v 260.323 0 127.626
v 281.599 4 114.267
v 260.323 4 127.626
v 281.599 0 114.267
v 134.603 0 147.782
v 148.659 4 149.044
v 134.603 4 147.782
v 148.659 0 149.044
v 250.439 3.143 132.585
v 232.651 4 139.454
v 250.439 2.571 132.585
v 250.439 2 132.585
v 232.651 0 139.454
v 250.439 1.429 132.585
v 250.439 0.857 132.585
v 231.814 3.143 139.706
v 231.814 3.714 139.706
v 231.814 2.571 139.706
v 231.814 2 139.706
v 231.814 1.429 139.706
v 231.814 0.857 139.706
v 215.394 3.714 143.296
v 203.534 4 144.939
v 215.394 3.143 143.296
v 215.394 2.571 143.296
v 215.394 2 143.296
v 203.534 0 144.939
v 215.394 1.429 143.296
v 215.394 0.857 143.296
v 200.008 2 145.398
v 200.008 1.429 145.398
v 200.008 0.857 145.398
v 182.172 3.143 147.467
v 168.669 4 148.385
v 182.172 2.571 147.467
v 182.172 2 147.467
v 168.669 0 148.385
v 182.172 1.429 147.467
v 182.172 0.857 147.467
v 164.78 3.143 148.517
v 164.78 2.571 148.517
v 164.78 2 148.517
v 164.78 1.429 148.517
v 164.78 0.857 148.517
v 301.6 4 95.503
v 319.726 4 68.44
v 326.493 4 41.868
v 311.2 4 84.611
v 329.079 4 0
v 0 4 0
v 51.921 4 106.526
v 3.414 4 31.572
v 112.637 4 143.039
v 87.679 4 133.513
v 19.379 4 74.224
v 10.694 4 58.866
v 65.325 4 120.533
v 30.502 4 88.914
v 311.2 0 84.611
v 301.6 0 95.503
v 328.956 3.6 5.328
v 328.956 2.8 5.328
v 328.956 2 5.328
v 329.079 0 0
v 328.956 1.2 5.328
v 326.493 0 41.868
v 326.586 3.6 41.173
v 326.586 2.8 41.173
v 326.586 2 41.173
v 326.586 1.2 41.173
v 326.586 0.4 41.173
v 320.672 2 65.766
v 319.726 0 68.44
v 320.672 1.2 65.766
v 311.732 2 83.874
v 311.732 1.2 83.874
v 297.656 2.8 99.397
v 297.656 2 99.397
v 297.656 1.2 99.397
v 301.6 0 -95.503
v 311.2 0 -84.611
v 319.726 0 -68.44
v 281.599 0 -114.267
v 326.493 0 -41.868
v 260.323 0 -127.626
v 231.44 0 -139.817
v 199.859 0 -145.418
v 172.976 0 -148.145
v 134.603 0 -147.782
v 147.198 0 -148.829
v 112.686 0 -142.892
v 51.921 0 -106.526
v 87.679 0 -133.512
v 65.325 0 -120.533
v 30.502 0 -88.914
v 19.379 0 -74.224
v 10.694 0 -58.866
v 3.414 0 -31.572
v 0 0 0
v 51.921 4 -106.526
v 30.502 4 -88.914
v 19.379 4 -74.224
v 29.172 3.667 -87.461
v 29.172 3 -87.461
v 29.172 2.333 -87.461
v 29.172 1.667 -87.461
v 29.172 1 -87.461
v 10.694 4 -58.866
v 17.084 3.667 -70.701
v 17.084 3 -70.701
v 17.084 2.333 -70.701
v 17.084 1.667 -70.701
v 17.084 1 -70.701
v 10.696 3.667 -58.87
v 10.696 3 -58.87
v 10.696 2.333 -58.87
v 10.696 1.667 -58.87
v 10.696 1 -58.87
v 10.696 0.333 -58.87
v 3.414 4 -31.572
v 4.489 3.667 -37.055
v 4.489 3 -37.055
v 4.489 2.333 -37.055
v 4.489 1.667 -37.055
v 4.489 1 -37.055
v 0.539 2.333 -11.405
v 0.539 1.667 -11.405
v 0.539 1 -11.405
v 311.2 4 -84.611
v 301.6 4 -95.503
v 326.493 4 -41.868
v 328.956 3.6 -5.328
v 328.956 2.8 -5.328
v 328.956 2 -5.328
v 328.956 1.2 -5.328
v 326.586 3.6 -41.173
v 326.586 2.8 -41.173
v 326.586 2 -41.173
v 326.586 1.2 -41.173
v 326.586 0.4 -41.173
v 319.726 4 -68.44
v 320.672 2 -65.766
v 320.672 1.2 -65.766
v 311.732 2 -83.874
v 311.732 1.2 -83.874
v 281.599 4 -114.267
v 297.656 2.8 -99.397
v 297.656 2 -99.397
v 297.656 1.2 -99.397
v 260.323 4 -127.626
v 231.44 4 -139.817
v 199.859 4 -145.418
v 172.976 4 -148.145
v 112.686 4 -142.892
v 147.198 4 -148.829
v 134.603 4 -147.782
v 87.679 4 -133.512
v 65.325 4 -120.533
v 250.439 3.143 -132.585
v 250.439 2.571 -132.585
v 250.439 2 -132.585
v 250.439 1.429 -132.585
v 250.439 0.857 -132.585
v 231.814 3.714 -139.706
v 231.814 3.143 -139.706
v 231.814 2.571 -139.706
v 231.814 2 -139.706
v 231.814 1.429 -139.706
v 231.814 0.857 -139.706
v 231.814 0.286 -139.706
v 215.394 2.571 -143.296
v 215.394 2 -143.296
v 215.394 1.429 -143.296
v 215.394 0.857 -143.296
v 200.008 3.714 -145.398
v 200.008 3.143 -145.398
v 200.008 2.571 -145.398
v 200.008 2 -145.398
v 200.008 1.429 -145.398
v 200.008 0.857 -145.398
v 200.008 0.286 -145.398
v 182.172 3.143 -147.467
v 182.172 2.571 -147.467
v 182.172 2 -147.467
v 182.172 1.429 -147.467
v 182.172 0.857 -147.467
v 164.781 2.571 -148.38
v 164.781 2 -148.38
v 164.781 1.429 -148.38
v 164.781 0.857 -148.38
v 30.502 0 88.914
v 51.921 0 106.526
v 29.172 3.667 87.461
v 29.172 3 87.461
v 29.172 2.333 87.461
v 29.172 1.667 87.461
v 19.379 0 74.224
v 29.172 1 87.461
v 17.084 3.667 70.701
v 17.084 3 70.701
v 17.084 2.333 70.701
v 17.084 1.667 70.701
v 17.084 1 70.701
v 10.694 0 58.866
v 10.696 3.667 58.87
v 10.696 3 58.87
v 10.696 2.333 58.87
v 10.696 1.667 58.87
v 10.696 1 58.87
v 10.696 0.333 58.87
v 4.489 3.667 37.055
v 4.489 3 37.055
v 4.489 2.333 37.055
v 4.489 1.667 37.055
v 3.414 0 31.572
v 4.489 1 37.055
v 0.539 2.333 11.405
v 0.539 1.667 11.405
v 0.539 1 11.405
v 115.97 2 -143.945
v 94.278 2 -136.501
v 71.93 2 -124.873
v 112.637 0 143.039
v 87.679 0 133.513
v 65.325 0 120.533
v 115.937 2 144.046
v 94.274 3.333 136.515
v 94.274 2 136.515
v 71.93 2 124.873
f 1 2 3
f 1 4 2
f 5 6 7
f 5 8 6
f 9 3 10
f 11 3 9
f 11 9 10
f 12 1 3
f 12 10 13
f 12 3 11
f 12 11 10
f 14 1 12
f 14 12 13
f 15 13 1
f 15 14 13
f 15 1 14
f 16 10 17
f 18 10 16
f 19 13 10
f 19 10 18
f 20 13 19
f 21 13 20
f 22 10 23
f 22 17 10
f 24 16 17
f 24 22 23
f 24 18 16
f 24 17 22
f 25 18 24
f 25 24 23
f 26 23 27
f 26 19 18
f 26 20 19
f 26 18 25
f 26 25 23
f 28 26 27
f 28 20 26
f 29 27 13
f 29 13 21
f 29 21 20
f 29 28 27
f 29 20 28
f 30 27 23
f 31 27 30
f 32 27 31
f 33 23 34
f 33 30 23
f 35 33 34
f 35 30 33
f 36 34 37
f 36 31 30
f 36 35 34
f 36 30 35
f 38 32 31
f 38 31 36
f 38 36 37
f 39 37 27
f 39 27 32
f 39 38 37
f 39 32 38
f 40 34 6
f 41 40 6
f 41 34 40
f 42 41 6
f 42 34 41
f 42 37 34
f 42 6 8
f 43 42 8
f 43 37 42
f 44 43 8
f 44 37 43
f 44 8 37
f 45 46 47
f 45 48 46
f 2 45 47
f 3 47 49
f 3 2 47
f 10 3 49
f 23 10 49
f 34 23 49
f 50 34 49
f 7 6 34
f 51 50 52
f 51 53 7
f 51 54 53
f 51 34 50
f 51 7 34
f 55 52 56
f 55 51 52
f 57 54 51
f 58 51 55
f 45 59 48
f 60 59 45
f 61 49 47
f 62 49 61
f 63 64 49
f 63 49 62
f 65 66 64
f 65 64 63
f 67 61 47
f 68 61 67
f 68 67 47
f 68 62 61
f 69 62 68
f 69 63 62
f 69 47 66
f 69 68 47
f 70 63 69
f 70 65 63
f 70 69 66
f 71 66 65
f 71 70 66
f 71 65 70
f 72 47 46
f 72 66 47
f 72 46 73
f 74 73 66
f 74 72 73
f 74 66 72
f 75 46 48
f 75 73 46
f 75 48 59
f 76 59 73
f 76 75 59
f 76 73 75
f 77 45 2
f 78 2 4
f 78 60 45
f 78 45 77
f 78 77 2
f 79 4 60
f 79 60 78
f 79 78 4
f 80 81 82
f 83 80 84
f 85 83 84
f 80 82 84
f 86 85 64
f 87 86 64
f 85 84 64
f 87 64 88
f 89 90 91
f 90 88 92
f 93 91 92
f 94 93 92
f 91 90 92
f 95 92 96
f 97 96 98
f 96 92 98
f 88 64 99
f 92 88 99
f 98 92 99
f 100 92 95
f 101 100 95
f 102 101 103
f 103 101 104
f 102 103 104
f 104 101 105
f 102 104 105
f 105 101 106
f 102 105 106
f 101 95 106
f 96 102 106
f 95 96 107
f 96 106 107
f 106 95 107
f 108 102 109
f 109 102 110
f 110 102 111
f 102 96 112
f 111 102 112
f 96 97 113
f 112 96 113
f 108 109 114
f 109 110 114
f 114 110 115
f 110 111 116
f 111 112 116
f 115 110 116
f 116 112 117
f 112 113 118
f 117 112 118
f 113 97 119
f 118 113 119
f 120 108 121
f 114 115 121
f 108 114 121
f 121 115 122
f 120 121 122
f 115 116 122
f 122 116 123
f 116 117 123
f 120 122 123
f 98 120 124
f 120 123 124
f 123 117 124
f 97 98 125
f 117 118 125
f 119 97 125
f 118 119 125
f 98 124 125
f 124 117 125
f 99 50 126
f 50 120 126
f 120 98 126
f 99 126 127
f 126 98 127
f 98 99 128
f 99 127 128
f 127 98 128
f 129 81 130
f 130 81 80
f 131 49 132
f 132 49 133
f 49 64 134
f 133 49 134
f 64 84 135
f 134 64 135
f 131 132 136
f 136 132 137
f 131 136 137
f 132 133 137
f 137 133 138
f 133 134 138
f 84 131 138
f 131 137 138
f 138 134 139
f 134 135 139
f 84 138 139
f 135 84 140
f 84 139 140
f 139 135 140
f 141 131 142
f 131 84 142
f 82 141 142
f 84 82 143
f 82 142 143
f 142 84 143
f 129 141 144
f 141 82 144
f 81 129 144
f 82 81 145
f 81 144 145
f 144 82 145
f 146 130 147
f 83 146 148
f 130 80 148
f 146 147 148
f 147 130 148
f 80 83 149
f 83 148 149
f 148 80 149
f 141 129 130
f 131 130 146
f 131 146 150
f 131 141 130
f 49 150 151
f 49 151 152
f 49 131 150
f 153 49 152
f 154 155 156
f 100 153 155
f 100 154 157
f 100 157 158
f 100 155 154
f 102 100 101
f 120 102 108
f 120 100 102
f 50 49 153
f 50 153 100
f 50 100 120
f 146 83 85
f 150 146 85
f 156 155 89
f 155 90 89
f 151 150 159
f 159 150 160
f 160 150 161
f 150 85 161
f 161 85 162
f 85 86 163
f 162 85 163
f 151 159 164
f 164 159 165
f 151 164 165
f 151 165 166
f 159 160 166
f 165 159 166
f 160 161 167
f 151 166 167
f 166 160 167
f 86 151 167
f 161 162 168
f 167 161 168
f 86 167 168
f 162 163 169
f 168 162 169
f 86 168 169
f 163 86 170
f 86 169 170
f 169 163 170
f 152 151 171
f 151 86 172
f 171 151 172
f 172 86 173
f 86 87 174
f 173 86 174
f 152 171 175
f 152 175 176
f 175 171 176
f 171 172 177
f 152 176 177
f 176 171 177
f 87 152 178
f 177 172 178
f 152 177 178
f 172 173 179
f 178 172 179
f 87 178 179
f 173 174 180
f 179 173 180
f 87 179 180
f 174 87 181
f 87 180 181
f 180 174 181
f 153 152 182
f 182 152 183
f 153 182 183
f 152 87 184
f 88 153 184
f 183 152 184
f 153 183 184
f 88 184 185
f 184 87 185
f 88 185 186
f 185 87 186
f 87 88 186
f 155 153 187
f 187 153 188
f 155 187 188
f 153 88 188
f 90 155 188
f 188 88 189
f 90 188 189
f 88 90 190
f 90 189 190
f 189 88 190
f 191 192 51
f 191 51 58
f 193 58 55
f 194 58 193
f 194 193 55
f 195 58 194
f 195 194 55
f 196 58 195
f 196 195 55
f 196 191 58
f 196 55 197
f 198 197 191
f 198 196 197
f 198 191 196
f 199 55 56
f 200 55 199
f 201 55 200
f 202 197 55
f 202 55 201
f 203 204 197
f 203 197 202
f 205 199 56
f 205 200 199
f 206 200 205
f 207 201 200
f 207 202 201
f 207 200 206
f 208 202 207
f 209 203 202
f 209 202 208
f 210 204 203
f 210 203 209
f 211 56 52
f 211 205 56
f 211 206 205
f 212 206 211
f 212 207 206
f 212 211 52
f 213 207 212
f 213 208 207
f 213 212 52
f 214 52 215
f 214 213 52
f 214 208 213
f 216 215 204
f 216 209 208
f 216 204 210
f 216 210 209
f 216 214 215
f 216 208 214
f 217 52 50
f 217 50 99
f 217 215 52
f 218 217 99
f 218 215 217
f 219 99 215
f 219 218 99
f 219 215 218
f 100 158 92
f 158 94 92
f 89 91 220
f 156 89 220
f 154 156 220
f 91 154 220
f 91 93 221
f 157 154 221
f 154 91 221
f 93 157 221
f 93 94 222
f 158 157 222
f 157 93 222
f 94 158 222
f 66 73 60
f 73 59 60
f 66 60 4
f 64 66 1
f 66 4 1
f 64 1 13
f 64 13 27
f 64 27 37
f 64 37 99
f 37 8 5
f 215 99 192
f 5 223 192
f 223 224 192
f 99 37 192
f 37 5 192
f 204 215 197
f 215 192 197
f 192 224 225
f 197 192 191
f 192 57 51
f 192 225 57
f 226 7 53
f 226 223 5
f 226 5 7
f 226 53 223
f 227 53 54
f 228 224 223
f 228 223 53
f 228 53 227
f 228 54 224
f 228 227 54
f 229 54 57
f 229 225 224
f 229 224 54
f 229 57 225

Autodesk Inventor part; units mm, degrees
ref_plane "YZ Plane" through (0, 0, 0) normal (1, 0, 0) x (0, 1, 0)
ref_plane "XZ Plane" through (0, 0, 0) normal (0, 1, 0) x (-1, 0, 0)
ref_plane "XY Plane" through (0, 0, 0) normal (0, 0, 1) x (1, 0, 0)
sketch "Эскиз1" plane through (0, 0, 0) normal (0, 1, 0) x (-1, 0, 0)
  line L0 (-328.2756, -25.9261) -> (-328.9804, -14.346) construction
  line L1 (-328.9804, -14.346) -> (-329.4417, 0) construction
  line L2 (-329.4417, 0) -> (-328.3635, 17.7121) construction
  line L3 (-328.3635, 17.7121) -> (-327.4394, 35.1161) construction
  line L4 (-327.4394, 35.1161) -> (-325.96, 47.5638) construction
  line L5 (-325.96, 47.5638) -> (-322.3039, 60.9695) construction
  line L6 (-322.3039, 60.9695) -> (-319.1353, 70.8815) construction
  line L7 (-319.1353, 70.8815) -> (-314.3418, 80.4686) construction
  line L8 (-314.3418, 80.4686) -> (-309.3045, 87.4558) construction
  line L9 (-309.3045, 87.4558) -> (-302.3173, 94.9305) construction
  line L10 (-302.3173, 94.9305) -> (-295.98, 101.1053) construction
  line L11 (-295.98, 101.1053) -> (-288.7491, 107.7675) construction
  line L12 (-288.7491, 107.7675) -> (-281.5994, 114.2672) construction
  spline S0 degree 4 poles (-328.2756, -25.9261) (-328.9804, -14.346) (-329.4417, 0) (-328.3635, 17.7121) (-327.4394, 35.1161) (-325.96, 47.5638) (-322.3039, 60.9695) (-319.1353, 70.8815) (-314.3418, 80.4686) (-309.3045, 87.4558) (-302.3173, 94.9305) (-295.98, 101.1053) (-288.7491, 107.7675) (-281.5994, 114.2672) knots 1 1 1 1 1 2 3 4 5 6 7 8 9 10 11 11 11 11 11
  line L13 (-281.5994, 114.2672) -> (-273.0291, 120.561) construction
  line L14 (-273.0291, 120.561) -> (-264.5363, 125.5696) construction
  line L15 (-264.5363, 125.5696) -> (-254.3013, 130.7234) construction
  line L16 (-254.3013, 130.7234) -> (-246.2439, 134.7158) construction
  line L17 (-246.2439, 134.7158) -> (-236.5897, 138.3452) construction
  line L18 (-236.5897, 138.3452) -> (-226.8628, 141.2487) construction
  line L19 (-226.8628, 141.2487) -> (-219.3136, 142.7005) construction
  line L20 (-219.3136, 142.7005) -> (-211.474, 143.9345) construction
  line L21 (-211.474, 143.9345) -> (-203.9248, 144.8781) construction
  line L22 (-203.9248, 144.8781) -> (-196.2304, 145.8944) construction
  line L23 (-196.2304, 145.8944) -> (-187.0117, 147.1284) construction
  line L24 (-187.0117, 147.1284) -> (-177.2848, 147.8543) construction
  line L25 (-177.2848, 147.8543) -> (-168.6468, 148.5076) construction
  line L26 (-168.6468, 148.5076) -> (-161.0976, 148.5076) construction
  line L27 (-161.0976, 148.5076) -> (-152.9677, 149.1609) construction
  line L28 (-152.9677, 149.1609) -> (-144.6926, 149.1609) construction
  line L29 (-144.6926, 149.1609) -> (-134.6028, 147.7817) construction
  spline S1 degree 4 poles (-281.5994, 114.2672) (-273.0291, 120.561) (-264.5363, 125.5696) (-254.3013, 130.7234) (-246.2439, 134.7158) (-236.5897, 138.3452) (-226.8628, 141.2487) (-219.3136, 142.7005) (-211.474, 143.9345) (-203.9248, 144.8781) (-196.2304, 145.8944) (-187.0117, 147.1284) (-177.2848, 147.8543) (-168.6468, 148.5076) (-161.0976, 148.5076) (-152.9677, 149.1609) (-144.6926, 149.1609) (-134.6028, 147.7817) knots 1 1 1 1 1 2 3 4 5 6 7 8 9 10 11 12 13 14 15 15 15 15 15
  line L30 (-134.6028, 147.7817) -> (-125.6357, 146.6668) construction
  line L31 (-125.6357, 146.6668) -> (-119.0855, 145.1103) construction
  line L32 (-119.0855, 145.1103) -> (-109.2278, 141.9974) construction
  line L33 (-109.2278, 141.9974) -> (-99.435, 138.7547) construction
  line L34 (-99.435, 138.7547) -> (-89.1882, 134.4744) construction
  line L35 (-89.1882, 134.4744) -> (-78.4874, 128.8322) construction
  line L36 (-78.4874, 128.8322) -> (-69.2134, 123.3845) construction
  line L37 (-69.2134, 123.3845) -> (-60.588, 117.6774) construction
  line L38 (-60.588, 117.6774) -> (-51.9211, 106.5265) construction
  spline S2 degree 4 poles (-134.6028, 147.7817) (-125.6357, 146.6668) (-119.0855, 145.1103) (-109.2278, 141.9974) (-99.435, 138.7547) (-89.1882, 134.4744) (-78.4874, 128.8322) (-69.2134, 123.3845) (-60.588, 117.6774) (-51.9211, 106.5265) knots 1 1 1 1 1 2 3 4 5 6 7 7 7 7 7
  line L39 (-51.9211, 106.5265) -> (-45.8249, 101.9867) construction
  line L40 (-45.8249, 101.9867) -> (-39.145, 96.9282) construction
  line L41 (-39.145, 96.9282) -> (-31.8815, 90.832) construction
  line L42 (-31.8815, 90.832) -> (-26.1744, 84.1521) construction
  line L43 (-26.1744, 84.1521) -> (-19.9485, 75.2673) construction
  line L44 (-19.9485, 75.2673) -> (-13.8523, 65.669) construction
  line L45 (-13.8523, 65.669) -> (-12.0364, 62.3615) construction
  line L46 (-12.0364, 62.3615) -> (-9.5072, 56.0707) construction
  line L47 (-9.5072, 56.0707) -> (-5.8754, 44.462) construction
  line L48 (-5.8754, 44.462) -> (-2.957, 29.6755) construction
  line L49 (-2.957, 29.6755) -> (-1.0763, 17.7425) construction
  line L50 (-1.0763, 17.7425) -> (0.1559, 5.3556) construction
  line L51 (0.1559, 5.3556) -> (0.1559, -6.1883) construction
  line L52 (0.1559, -6.1883) -> (-0.8168, -22.8555) construction
  line L53 (-0.8168, -22.8555) -> (-2.3085, -36.4747) construction
  spline S3 degree 4 poles (-51.9211, 106.5265) (-45.8249, 101.9867) (-39.145, 96.9282) (-31.8815, 90.832) (-26.1744, 84.1521) (-19.9485, 75.2673) (-13.8523, 65.669) (-12.0364, 62.3615) (-9.5072, 56.0707) (-5.8754, 44.462) (-2.957, 29.6755) (-1.0763, 17.7425) (0.1559, 5.3556) (0.1559, -6.1883) (-0.8168, -22.8555) (-2.3085, -36.4747) knots 1 1 1 1 1 2 3 4 5 6 7 8 9 10 11 12 13 13 13 13 13
  line L54 (-329.4417, 0) -> (0, 0)
  line L55 (-328.2756, 25.9261) -> (-328.9804, 14.346) construction
  line L56 (-328.9804, 14.346) -> (-329.4417, 0) construction
  line L57 (-329.4417, 0) -> (-328.3635, -17.7121) construction
  line L58 (-328.3635, -17.7121) -> (-327.4394, -35.1161) construction
  line L59 (-327.4394, -35.1161) -> (-325.96, -47.5638) construction
  line L60 (-325.96, -47.5638) -> (-322.3039, -60.9695) construction
  line L61 (-322.3039, -60.9695) -> (-319.1353, -70.8815) construction
  line L62 (-319.1353, -70.8815) -> (-314.3418, -80.4686) construction
  line L63 (-314.3418, -80.4686) -> (-309.3045, -87.4558) construction
  line L64 (-309.3045, -87.4558) -> (-302.3173, -94.9305) construction
  line L65 (-302.3173, -94.9305) -> (-295.98, -101.1053) construction
  line L66 (-295.98, -101.1053) -> (-288.7491, -107.7675) construction
  line L67 (-288.7491, -107.7675) -> (-281.5994, -114.2672) construction
  spline S4 degree 4 poles (-328.2756, 25.9261) (-328.9804, 14.346) (-329.4417, 0) (-328.3635, -17.7121) (-327.4394, -35.1161) (-325.96, -47.5638) (-322.3039, -60.9695) (-319.1353, -70.8815) (-314.3418, -80.4686) (-309.3045, -87.4558) (-302.3173, -94.9305) (-295.98, -101.1053) (-288.7491, -107.7675) (-281.5994, -114.2672) knots 1 1 1 1 1 2 3 4 5 6 7 8 9 10 11 11 11 11 11
  line L68 (-281.5994, -114.2672) -> (-273.0291, -120.561) construction
  line L69 (-273.0291, -120.561) -> (-264.5363, -125.5696) construction
  line L70 (-264.5363, -125.5696) -> (-254.3013, -130.7234) construction
  line L71 (-254.3013, -130.7234) -> (-246.2439, -134.7158) construction
  line L72 (-246.2439, -134.7158) -> (-236.5897, -138.3452) construction
  line L73 (-236.5897, -138.3452) -> (-226.8628, -141.2487) construction
  line L74 (-226.8628, -141.2487) -> (-219.3136, -142.7005) construction
  line L75 (-219.3136, -142.7005) -> (-211.474, -143.9345) construction
  line L76 (-211.474, -143.9345) -> (-203.9248, -144.8781) construction
  line L77 (-203.9248, -144.8781) -> (-196.2304, -145.8944) construction
  line L78 (-196.2304, -145.8944) -> (-187.0117, -147.1284) construction
  line L79 (-187.0117, -147.1284) -> (-177.2848, -147.8543) construction
  line L80 (-177.2848, -147.8543) -> (-168.6468, -148.5076) construction
  line L81 (-168.6468, -148.5076) -> (-161.1015, -148.2639) construction
  line L82 (-161.1015, -148.2639) -> (-152.9547, -148.6545) construction
  line L83 (-152.9547, -148.6545) -> (-144.6926, -149.1609) construction
  line L84 (-144.6926, -149.1609) -> (-134.6028, -147.7817) construction
  spline S5 degree 4 poles (-281.5994, -114.2672) (-273.0291, -120.561) (-264.5363, -125.5696) (-254.3013, -130.7234) (-246.2439, -134.7158) (-236.5897, -138.3452) (-226.8628, -141.2487) (-219.3136, -142.7005) (-211.474, -143.9345) (-203.9248, -144.8781) (-196.2304, -145.8944) (-187.0117, -147.1284) (-177.2848, -147.8543) (-168.6468, -148.5076) (-161.1015, -148.2639) (-152.9547, -148.6545) (-144.6926, -149.1609) (-134.6028, -147.7817) knots 1 1 1 1 1 2 3 4 5 6 7 8 9 10 11 12 13 14 15 15 15 15 15
  line L85 (-134.6028, -147.7817) -> (-125.6357, -146.6668) construction
  line L86 (-125.6357, -146.6668) -> (-119.0855, -145.1103) construction
  line L87 (-119.0855, -145.1103) -> (-109.3334, -141.6808) construction
  line L88 (-109.3334, -141.6808) -> (-99.435, -138.7547) construction
  line L89 (-99.435, -138.7547) -> (-89.1882, -134.4744) construction
  line L90 (-89.1882, -134.4744) -> (-78.4874, -128.8322) construction
  line L91 (-78.4874, -128.8322) -> (-69.2134, -123.3845) construction
  line L92 (-69.2134, -123.3845) -> (-60.588, -117.6774) construction
  line L93 (-60.588, -117.6774) -> (-51.9211, -106.5265) construction
  spline S6 degree 4 poles (-134.6028, -147.7817) (-125.6357, -146.6668) (-119.0855, -145.1103) (-109.3334, -141.6808) (-99.435, -138.7547) (-89.1882, -134.4744) (-78.4874, -128.8322) (-69.2134, -123.3845) (-60.588, -117.6774) (-51.9211, -106.5265) knots 1 1 1 1 1 2 3 4 5 6 7 7 7 7 7
  line L94 (-51.9211, -106.5265) -> (-45.8249, -101.9867) construction
  line L95 (-45.8249, -101.9867) -> (-39.145, -96.9282) construction
  line L96 (-39.145, -96.9282) -> (-31.8815, -90.832) construction
  line L97 (-31.8815, -90.832) -> (-26.1744, -84.1521) construction
  line L98 (-26.1744, -84.1521) -> (-19.9485, -75.2673) construction
  line L99 (-19.9485, -75.2673) -> (-13.8523, -65.669) construction
  line L100 (-13.8523, -65.669) -> (-12.0364, -62.3615) construction
  line L101 (-12.0364, -62.3615) -> (-9.5072, -56.0707) construction
  line L102 (-9.5072, -56.0707) -> (-5.8754, -44.462) construction
  line L103 (-5.8754, -44.462) -> (-2.957, -29.6755) construction
  line L104 (-2.957, -29.6755) -> (-1.0763, -17.7425) construction
  line L105 (-1.0763, -17.7425) -> (0.1559, -5.3556) construction
  line L106 (0.1559, -5.3556) -> (0.1559, 6.1883) construction
  line L107 (0.1559, 6.1883) -> (-0.8168, 22.8555) construction
  line L108 (-0.8168, 22.8555) -> (-2.3085, 36.4747) construction
  spline S7 degree 4 poles (-51.9211, -106.5265) (-45.8249, -101.9867) (-39.145, -96.9282) (-31.8815, -90.832) (-26.1744, -84.1521) (-19.9485, -75.2673) (-13.8523, -65.669) (-12.0364, -62.3615) (-9.5072, -56.0707) (-5.8754, -44.462) (-2.957, -29.6755) (-1.0763, -17.7425) (0.1559, -5.3556) (0.1559, 6.1883) (-0.8168, 22.8555) (-2.3085, 36.4747) knots 1 1 1 1 1 2 3 4 5 6 7 8 9 10 11 12 13 13 13 13 13
  point P0 (0, 0)
  point P1 (-0.5497, -16.6468)
  point P2 (0, 0)
  point P3 (-1.0867, 16.6204)
  point P4 (-329.0787, 0)
  dimension "d29" = 295.5634
extrude "Выдавливание1" add sketch "Эскиз1" along normal blind 4
properties part number "head_1"
